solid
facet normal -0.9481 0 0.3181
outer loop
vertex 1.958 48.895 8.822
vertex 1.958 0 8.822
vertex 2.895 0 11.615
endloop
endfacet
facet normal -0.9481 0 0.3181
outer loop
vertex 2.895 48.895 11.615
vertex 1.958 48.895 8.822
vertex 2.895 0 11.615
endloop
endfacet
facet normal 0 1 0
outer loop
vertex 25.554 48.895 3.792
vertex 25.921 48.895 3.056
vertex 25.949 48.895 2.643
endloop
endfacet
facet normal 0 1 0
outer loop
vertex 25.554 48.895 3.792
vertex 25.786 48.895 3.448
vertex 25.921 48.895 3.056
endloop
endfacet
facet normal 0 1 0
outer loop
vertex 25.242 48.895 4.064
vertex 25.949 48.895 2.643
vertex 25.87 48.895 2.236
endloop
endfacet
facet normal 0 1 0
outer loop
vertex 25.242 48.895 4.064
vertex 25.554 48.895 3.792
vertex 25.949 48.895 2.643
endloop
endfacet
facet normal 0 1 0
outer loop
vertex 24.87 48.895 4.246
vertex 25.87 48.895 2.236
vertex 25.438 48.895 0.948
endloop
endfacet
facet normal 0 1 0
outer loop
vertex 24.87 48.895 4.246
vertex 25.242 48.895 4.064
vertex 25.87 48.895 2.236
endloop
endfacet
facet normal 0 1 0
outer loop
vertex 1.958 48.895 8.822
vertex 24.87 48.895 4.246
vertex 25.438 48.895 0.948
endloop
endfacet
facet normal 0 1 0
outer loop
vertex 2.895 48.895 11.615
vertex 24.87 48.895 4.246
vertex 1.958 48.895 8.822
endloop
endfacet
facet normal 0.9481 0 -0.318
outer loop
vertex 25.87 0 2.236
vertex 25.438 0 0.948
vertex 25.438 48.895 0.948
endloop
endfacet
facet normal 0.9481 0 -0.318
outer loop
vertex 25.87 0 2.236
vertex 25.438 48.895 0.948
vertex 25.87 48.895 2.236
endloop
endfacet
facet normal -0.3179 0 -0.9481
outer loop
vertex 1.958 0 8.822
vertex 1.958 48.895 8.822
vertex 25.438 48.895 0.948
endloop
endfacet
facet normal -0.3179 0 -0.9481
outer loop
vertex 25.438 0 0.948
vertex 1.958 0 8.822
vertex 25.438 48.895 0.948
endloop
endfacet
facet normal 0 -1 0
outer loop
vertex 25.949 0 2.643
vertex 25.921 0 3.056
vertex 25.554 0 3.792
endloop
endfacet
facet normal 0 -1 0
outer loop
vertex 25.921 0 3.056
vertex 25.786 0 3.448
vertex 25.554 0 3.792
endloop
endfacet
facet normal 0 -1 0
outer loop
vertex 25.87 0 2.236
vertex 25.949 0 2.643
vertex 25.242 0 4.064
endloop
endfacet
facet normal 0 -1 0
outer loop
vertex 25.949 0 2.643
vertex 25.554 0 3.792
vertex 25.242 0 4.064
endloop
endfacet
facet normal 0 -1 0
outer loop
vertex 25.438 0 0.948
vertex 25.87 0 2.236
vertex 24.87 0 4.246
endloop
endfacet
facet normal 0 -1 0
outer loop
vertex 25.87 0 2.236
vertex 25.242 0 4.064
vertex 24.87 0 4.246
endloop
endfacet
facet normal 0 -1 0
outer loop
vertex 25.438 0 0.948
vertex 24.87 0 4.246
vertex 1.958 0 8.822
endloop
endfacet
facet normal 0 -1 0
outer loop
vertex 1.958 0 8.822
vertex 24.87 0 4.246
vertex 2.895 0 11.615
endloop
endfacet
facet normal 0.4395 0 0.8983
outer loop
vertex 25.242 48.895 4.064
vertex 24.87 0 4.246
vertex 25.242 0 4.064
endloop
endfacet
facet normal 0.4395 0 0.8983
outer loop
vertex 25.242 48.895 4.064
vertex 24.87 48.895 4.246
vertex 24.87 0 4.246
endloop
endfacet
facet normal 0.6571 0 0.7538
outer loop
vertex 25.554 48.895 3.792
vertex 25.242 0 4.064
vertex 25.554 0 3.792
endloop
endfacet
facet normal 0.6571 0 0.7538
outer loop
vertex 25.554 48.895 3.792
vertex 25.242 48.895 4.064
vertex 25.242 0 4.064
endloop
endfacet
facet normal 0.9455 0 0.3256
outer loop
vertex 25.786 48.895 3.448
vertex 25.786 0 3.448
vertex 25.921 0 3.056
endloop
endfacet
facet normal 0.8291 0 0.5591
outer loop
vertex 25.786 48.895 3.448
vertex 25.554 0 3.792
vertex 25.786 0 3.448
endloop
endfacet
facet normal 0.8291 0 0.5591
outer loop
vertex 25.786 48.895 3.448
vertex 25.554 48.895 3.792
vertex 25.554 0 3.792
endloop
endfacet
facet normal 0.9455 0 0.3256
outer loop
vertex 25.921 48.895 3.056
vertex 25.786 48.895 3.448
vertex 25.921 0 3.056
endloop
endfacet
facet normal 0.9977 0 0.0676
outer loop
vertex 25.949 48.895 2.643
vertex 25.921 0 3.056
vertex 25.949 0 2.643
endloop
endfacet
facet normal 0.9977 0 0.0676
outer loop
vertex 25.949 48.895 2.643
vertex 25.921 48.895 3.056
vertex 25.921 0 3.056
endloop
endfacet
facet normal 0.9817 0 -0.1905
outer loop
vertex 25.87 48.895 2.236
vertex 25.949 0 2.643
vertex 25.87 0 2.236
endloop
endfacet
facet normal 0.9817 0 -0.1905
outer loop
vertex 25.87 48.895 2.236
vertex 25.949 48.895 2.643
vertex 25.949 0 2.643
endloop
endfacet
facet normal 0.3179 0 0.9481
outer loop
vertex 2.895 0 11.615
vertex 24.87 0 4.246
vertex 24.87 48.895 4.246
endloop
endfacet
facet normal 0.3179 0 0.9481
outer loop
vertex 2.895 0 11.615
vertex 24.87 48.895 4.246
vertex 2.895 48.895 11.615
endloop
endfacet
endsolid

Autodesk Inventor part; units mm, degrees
ref_plane "YZ Plane" through (0, 0, 0) normal (1, 0, 0) x (0, 1, 0)
ref_plane "XZ Plane" through (0, 0, 0) normal (0, 1, 0) x (-1, 0, 0)
ref_plane "XY Plane" through (0, 0, 0) normal (0, 0, 1) x (1, 0, 0)
sketch "Sketch1" plane through (0, 0, 0) normal (0, 1, 0) x (-1, 0, 0)
  line L0 (-1.958, 8.8218) -> (-25.4378, 0.9475)
  line L1 (-26.3747, 3.741) -> (-2.8949, 11.6153)
  line L2 (-1.958, 8.8218) -> (-2.8949, 11.6153)
  line L3 (-25.4378, 0.9475) -> (-26.3747, 3.741)
  point P0 (0, 0)
  point P1 (-9.2456, 5.0352)
  dimension "d0" = 24.765
  dimension "d5" = 2.9464
extrude "Extrusion1" add sketch "Sketch1" along normal blind 48.895
fillet "Fillet1" radius 1.5875 1 edges at (26.3747, 24.4475, 3.741)
properties part number "Lidar Sensor Case Piece 4"
